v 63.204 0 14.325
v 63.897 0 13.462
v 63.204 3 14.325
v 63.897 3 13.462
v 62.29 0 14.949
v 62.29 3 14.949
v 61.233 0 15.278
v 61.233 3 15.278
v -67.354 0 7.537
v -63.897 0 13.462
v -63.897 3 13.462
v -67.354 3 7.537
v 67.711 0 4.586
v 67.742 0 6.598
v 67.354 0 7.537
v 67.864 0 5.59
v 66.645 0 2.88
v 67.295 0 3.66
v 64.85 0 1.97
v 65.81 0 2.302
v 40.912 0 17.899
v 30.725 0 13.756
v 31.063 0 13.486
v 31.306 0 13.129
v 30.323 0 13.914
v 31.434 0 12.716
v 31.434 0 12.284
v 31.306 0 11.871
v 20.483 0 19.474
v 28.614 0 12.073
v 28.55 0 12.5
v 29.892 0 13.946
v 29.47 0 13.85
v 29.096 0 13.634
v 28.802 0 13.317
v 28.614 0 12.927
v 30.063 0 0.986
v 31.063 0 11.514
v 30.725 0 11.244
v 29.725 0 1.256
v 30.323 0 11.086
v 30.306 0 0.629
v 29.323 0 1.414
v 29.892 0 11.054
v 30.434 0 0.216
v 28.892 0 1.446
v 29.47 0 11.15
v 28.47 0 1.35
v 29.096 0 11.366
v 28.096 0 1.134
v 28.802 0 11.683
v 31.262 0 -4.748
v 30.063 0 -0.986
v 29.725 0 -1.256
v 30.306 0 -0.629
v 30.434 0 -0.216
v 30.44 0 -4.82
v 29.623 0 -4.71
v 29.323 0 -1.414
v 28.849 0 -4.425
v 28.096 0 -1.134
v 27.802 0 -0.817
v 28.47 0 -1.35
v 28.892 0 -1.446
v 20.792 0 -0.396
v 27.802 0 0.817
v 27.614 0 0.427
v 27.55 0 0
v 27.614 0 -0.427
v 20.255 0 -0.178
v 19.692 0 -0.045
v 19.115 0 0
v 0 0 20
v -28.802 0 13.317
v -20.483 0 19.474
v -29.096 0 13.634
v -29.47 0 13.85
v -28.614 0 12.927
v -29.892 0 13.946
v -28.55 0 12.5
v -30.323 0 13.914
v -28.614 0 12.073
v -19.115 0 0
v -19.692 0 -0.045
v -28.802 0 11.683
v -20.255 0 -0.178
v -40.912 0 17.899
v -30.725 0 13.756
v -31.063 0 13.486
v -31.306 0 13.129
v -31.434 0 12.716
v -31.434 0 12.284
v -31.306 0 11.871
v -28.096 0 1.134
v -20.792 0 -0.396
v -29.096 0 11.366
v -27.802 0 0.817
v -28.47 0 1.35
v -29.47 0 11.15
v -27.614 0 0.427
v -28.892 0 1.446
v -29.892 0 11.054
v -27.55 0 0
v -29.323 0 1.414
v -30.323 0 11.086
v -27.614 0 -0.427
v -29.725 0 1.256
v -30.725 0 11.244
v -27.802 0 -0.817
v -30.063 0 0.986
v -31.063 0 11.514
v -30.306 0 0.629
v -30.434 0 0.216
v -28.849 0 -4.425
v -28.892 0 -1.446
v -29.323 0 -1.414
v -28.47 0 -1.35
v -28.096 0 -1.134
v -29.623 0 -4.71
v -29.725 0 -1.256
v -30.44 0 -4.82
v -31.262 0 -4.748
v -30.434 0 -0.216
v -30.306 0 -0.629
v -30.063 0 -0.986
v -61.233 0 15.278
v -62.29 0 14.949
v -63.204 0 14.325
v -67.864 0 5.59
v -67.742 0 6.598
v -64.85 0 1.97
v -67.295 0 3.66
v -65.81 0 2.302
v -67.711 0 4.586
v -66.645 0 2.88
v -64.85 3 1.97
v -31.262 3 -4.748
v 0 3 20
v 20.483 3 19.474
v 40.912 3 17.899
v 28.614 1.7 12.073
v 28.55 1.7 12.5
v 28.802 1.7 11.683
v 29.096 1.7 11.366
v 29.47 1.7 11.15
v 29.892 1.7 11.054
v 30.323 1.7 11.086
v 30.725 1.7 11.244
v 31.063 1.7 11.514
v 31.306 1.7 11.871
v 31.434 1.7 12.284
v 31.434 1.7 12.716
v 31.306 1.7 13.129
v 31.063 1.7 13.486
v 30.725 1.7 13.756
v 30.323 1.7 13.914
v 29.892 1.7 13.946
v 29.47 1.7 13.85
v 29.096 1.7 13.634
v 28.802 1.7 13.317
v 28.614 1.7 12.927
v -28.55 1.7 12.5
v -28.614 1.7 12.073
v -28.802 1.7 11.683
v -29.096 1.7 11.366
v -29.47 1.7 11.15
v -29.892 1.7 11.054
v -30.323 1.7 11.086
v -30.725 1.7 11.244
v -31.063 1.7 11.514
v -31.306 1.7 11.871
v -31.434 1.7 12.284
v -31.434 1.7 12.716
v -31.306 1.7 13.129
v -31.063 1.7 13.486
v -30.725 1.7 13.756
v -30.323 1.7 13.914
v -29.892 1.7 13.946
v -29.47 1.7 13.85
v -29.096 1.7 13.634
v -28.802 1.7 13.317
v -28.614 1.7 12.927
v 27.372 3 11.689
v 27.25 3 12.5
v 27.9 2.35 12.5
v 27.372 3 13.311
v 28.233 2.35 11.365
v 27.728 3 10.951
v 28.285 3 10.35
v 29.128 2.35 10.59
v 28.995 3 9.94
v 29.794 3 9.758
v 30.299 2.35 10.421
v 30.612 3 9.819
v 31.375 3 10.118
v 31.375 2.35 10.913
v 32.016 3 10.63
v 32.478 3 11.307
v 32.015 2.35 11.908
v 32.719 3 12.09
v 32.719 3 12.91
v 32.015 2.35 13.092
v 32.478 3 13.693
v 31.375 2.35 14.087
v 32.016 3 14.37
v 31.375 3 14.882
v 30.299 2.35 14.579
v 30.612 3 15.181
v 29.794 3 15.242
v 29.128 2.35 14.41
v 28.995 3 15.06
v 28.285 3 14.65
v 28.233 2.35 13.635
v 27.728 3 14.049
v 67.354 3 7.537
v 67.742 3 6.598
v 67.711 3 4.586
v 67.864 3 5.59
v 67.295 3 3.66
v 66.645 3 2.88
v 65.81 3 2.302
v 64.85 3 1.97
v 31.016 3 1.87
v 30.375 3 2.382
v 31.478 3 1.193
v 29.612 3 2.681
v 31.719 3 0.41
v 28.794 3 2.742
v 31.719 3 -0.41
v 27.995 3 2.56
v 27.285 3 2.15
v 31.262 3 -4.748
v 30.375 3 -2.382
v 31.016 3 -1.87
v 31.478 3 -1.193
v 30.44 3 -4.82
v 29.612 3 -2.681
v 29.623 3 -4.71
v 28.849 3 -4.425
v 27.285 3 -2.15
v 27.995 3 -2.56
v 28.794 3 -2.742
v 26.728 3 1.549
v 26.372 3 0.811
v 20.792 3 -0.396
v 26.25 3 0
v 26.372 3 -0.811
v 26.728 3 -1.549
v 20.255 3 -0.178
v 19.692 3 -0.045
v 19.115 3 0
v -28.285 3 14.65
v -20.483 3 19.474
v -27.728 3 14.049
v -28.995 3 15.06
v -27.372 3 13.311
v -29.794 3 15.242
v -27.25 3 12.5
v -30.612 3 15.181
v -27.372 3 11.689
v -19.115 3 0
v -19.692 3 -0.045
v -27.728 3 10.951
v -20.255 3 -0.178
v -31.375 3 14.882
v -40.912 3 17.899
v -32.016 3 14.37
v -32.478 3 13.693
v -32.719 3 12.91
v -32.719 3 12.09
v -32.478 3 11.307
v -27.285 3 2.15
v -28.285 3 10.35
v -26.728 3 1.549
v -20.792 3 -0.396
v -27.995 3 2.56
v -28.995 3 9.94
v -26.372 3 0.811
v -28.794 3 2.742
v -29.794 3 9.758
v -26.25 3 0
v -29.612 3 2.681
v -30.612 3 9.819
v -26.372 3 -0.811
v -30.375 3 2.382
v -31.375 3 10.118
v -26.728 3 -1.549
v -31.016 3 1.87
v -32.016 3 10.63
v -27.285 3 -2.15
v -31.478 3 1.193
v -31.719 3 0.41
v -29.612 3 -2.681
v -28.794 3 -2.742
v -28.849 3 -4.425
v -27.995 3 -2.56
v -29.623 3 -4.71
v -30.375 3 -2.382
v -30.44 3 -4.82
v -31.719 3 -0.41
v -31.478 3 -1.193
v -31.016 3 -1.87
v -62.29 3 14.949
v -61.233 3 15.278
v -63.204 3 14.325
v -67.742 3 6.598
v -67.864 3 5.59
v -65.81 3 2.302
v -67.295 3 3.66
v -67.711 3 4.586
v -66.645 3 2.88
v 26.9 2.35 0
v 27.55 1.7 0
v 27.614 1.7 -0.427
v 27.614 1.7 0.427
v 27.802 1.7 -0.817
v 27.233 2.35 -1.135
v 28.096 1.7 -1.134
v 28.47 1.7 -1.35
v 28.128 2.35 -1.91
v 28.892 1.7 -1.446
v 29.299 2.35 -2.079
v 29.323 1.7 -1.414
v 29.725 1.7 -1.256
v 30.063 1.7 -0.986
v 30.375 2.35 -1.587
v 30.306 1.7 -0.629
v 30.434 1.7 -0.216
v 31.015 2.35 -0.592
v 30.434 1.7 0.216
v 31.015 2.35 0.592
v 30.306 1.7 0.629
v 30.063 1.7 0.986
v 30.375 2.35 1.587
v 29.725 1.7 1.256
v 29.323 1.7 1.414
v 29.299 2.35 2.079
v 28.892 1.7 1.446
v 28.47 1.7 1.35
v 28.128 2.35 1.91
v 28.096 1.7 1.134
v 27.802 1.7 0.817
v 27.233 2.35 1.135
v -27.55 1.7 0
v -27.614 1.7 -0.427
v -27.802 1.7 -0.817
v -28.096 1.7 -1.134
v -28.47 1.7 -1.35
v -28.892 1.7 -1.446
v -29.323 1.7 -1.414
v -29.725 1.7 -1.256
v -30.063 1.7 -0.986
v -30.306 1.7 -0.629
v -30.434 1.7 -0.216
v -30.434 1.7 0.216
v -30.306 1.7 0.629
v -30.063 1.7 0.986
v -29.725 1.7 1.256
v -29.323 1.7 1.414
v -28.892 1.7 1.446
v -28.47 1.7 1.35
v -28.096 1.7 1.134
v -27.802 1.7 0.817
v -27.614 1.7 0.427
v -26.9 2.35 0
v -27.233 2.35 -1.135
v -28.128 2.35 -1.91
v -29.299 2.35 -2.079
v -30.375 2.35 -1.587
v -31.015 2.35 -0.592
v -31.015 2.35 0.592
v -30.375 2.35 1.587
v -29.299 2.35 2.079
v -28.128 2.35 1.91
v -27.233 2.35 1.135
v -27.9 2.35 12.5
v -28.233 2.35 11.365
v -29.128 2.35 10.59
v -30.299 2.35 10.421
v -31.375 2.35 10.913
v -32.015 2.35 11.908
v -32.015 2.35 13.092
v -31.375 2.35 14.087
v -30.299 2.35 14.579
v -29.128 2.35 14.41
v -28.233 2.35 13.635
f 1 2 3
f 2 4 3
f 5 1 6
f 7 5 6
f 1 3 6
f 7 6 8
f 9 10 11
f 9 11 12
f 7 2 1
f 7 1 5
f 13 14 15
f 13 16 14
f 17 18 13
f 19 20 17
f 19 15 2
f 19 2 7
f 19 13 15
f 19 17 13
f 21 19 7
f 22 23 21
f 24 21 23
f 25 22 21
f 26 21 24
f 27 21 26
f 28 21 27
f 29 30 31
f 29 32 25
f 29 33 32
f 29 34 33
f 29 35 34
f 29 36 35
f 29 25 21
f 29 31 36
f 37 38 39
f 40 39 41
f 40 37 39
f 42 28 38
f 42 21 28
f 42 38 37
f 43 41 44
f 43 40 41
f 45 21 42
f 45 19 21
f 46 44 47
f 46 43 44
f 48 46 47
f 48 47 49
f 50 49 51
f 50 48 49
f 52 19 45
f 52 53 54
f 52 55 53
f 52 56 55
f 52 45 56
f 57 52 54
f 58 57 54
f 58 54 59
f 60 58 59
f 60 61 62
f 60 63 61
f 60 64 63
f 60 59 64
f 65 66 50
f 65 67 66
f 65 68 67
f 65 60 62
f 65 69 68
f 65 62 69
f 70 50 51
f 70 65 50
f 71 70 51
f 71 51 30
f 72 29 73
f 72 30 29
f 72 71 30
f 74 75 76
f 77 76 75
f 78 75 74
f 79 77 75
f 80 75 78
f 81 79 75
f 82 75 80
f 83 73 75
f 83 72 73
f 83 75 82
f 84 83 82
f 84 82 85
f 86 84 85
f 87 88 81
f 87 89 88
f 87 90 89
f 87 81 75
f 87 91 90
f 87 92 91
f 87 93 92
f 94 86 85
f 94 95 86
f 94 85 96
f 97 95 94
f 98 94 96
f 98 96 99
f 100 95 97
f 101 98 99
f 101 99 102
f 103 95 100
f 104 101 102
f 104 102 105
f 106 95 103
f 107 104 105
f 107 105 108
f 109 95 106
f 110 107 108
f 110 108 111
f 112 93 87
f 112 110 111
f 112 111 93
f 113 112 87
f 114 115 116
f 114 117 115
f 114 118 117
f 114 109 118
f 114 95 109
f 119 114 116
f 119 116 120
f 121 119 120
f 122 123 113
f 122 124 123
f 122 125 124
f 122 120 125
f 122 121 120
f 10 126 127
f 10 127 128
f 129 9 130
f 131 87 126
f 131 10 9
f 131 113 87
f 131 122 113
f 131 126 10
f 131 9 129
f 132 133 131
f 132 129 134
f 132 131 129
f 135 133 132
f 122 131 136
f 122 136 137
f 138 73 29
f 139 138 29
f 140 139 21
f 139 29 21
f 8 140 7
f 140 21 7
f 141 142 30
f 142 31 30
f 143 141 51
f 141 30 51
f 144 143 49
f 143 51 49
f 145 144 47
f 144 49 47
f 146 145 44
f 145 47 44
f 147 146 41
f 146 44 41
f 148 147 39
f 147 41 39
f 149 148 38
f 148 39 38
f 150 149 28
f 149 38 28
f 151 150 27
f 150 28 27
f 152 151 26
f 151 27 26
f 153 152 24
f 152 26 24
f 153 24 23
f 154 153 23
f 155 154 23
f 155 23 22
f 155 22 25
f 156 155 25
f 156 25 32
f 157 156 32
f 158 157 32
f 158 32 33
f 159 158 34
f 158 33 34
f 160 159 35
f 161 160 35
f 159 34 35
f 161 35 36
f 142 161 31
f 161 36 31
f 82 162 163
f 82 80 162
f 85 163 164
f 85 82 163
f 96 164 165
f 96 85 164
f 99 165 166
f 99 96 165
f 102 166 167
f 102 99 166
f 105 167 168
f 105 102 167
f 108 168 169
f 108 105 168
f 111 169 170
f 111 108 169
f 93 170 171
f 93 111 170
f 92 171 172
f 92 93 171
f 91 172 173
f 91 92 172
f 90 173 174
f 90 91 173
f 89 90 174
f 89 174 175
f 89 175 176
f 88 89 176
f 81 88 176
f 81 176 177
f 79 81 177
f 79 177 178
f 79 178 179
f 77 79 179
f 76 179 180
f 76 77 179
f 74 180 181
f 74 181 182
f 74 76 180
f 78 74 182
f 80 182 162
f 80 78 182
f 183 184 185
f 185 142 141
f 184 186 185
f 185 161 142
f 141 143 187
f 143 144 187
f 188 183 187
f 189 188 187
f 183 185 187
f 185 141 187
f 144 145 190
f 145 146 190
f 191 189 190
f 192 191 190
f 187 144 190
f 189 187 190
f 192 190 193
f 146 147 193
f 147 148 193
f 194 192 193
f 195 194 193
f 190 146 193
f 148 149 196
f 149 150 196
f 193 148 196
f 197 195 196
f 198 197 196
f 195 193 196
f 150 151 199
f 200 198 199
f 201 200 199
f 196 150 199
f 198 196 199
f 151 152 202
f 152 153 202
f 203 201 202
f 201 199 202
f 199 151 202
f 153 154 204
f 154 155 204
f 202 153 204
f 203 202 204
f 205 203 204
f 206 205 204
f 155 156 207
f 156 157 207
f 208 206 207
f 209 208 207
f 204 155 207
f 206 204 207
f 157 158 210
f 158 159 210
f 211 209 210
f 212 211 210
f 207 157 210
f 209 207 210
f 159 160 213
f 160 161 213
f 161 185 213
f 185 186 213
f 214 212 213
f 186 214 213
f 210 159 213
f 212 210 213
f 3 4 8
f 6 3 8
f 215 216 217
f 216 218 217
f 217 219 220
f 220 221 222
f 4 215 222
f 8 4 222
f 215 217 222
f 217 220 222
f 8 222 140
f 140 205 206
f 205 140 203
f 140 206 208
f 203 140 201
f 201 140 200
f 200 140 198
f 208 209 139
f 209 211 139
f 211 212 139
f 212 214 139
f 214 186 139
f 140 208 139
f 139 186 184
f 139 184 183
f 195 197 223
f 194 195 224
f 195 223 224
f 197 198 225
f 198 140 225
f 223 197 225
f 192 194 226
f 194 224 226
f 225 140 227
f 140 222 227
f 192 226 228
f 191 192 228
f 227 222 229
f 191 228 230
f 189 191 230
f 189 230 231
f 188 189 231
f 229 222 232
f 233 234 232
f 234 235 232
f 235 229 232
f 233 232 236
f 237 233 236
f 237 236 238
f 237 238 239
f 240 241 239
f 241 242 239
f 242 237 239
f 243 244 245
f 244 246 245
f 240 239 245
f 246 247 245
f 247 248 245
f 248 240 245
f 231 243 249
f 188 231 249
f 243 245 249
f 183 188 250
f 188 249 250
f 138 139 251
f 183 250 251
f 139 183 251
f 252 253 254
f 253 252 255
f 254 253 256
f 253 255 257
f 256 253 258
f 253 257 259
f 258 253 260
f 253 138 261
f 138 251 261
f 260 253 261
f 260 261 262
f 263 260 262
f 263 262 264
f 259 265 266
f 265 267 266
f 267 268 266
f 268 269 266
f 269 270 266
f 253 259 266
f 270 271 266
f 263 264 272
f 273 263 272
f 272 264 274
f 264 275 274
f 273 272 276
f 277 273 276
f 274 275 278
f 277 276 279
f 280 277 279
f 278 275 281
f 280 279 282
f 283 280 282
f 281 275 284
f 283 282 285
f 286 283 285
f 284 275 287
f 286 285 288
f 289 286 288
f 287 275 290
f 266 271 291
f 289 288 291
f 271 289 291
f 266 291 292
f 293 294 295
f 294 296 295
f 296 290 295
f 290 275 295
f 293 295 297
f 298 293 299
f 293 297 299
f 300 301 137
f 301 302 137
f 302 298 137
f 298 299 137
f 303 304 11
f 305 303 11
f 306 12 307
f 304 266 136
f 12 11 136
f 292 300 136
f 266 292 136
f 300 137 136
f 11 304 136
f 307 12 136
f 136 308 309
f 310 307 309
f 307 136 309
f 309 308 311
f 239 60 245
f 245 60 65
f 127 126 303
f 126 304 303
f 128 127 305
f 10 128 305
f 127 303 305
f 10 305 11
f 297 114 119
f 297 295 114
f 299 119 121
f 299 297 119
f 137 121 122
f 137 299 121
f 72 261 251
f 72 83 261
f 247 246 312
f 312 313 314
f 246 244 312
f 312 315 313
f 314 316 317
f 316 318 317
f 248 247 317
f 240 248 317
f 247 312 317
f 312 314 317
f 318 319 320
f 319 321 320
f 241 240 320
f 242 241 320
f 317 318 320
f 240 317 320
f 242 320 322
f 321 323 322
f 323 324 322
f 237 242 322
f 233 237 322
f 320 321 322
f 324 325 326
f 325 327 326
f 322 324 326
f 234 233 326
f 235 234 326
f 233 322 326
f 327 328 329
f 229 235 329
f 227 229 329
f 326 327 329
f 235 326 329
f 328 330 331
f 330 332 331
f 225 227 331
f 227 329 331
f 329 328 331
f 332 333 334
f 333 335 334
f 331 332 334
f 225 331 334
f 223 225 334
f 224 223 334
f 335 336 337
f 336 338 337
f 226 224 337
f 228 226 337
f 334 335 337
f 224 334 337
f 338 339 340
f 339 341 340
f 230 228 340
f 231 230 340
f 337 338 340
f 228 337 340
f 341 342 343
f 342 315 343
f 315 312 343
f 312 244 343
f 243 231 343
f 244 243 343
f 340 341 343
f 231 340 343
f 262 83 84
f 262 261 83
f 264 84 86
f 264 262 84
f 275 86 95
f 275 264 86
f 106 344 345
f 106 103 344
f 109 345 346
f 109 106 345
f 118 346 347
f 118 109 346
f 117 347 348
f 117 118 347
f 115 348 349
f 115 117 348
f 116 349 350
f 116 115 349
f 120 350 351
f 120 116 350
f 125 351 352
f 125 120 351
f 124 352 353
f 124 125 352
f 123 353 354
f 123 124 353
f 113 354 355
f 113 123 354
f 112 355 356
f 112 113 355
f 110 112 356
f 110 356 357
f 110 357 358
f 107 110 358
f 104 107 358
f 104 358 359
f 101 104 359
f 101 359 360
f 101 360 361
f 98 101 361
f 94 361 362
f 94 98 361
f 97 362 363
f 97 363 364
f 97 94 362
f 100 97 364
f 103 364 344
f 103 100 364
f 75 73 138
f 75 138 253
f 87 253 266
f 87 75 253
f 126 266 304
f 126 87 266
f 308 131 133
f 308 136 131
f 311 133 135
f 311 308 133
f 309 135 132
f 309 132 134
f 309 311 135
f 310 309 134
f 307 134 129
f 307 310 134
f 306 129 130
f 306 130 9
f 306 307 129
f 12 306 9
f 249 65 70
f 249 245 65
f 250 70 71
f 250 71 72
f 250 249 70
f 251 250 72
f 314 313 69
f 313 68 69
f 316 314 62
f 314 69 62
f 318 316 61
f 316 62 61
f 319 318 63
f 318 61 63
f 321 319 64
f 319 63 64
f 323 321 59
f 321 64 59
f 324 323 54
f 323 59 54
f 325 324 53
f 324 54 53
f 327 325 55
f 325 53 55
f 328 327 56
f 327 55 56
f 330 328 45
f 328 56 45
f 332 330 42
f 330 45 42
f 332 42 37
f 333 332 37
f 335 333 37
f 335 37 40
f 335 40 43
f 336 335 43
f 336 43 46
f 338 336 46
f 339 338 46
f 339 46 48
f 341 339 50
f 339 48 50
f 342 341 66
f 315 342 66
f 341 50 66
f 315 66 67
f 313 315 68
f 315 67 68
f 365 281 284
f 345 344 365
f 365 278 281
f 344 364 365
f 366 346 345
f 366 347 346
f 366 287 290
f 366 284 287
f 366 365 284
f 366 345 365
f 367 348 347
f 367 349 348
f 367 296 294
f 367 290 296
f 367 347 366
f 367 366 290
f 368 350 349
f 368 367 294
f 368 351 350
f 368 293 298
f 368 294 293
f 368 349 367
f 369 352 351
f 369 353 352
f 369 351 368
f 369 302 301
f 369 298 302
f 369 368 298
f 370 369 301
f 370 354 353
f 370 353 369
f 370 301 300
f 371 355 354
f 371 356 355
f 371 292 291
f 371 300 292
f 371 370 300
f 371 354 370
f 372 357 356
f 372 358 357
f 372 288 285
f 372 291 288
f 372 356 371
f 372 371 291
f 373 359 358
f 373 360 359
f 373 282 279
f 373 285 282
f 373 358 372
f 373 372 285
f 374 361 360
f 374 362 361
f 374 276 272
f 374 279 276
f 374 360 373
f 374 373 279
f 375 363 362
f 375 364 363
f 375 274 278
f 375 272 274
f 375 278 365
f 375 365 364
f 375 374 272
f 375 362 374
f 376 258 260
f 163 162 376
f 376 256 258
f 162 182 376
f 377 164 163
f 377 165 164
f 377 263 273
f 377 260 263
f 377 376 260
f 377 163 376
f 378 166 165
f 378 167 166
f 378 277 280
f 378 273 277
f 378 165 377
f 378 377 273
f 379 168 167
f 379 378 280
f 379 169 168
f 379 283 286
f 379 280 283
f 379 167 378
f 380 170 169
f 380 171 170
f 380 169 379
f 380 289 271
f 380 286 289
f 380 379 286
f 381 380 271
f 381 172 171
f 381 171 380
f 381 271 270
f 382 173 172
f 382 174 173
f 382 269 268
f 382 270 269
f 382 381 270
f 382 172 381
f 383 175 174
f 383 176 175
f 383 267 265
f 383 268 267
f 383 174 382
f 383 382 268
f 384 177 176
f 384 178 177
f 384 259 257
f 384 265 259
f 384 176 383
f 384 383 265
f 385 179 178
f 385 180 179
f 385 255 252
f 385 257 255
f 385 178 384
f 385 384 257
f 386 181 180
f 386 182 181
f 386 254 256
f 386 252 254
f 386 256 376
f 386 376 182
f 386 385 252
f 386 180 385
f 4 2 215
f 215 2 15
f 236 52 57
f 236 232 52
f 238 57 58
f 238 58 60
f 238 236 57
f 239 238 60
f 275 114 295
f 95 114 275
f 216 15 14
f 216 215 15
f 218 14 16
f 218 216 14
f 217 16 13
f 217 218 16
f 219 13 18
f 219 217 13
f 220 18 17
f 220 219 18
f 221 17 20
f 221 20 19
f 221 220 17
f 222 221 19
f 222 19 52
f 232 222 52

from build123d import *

# Parameters (mm, degrees)
BOSS_EXTRUDE1_DEPTH                               = 3
CSK_FOR_M2_5_FLAT_HEAD_MACHINE_SCREW1_D           = 2.9
CSK_FOR_M2_5_FLAT_HEAD_MACHINE_SCREW1_CSINK_D     = 5.5
CSK_FOR_M2_5_FLAT_HEAD_MACHINE_SCREW1_CSINK_ANGLE = 90
FILLET1_R                                         = 3.75


with BuildPart() as part:
    # Sketch1 → Boss-Extrude1 (new body)
    with BuildSketch(Plane(origin=(0, 0, 0), x_dir=(1, 0, 0), z_dir=(0, 1, 0))):
        with BuildLine():
            Line((0, 0), (0, -20))
            ThreePointArc((0, -20), (31.599050619, -18.748037795), (63, -15))
            Line((63, -15), (70, -3))
            Line((70, -3), (30, 5))
            Line((30, 5), (20, 0))
            Line((20, 0), (0, 0))
        make_face()
    boss_extrude1 = extrude(amount=BOSS_EXTRUDE1_DEPTH)

    # CSK for M2.5 Flat Head Machine Screw1 (through all)
    with Locations(Plane(origin=(0, 3, 0), x_dir=(1, 0, 0), z_dir=(0, 1, 0))):
        with Locations((29, 0), (30, -12.5)):
            csk_for_m2_5_flat_head_machine_screw1 = CounterSinkHole(CSK_FOR_M2_5_FLAT_HEAD_MACHINE_SCREW1_D / 2, CSK_FOR_M2_5_FLAT_HEAD_MACHINE_SCREW1_CSINK_D / 2, counter_sink_angle=CSK_FOR_M2_5_FLAT_HEAD_MACHINE_SCREW1_CSINK_ANGLE)

    # Mirror1: Boss-Extrude1, CSK for M2.5 Flat Head Machine Screw1 across plane
    add(boss_extrude1.mirror(Plane(origin=(0, 0, 0), x_dir=(0, 0, 1), z_dir=(1, 0, 0))))
    add(csk_for_m2_5_flat_head_machine_screw1.mirror(Plane(origin=(0, 0, 0), x_dir=(0, 0, 1), z_dir=(1, 0, 0))), mode=Mode.SUBTRACT)

    # Fillet1
    fillet1_edges = [part.edges().sort_by_distance(p)[0] for p in [
        (20, 1.5, 0),
        (30, 1.5, -5),
        (70, 1.5, 3),
        (63, 1.5, 15),
        (-20, 1.5, 0),
        (-30, 1.5, -5),
        (-70, 1.5, 3),
        (-63, 1.5, 15),
    ]]
    fillet(fillet1_edges, radius=FILLET1_R)


solid = part.part
